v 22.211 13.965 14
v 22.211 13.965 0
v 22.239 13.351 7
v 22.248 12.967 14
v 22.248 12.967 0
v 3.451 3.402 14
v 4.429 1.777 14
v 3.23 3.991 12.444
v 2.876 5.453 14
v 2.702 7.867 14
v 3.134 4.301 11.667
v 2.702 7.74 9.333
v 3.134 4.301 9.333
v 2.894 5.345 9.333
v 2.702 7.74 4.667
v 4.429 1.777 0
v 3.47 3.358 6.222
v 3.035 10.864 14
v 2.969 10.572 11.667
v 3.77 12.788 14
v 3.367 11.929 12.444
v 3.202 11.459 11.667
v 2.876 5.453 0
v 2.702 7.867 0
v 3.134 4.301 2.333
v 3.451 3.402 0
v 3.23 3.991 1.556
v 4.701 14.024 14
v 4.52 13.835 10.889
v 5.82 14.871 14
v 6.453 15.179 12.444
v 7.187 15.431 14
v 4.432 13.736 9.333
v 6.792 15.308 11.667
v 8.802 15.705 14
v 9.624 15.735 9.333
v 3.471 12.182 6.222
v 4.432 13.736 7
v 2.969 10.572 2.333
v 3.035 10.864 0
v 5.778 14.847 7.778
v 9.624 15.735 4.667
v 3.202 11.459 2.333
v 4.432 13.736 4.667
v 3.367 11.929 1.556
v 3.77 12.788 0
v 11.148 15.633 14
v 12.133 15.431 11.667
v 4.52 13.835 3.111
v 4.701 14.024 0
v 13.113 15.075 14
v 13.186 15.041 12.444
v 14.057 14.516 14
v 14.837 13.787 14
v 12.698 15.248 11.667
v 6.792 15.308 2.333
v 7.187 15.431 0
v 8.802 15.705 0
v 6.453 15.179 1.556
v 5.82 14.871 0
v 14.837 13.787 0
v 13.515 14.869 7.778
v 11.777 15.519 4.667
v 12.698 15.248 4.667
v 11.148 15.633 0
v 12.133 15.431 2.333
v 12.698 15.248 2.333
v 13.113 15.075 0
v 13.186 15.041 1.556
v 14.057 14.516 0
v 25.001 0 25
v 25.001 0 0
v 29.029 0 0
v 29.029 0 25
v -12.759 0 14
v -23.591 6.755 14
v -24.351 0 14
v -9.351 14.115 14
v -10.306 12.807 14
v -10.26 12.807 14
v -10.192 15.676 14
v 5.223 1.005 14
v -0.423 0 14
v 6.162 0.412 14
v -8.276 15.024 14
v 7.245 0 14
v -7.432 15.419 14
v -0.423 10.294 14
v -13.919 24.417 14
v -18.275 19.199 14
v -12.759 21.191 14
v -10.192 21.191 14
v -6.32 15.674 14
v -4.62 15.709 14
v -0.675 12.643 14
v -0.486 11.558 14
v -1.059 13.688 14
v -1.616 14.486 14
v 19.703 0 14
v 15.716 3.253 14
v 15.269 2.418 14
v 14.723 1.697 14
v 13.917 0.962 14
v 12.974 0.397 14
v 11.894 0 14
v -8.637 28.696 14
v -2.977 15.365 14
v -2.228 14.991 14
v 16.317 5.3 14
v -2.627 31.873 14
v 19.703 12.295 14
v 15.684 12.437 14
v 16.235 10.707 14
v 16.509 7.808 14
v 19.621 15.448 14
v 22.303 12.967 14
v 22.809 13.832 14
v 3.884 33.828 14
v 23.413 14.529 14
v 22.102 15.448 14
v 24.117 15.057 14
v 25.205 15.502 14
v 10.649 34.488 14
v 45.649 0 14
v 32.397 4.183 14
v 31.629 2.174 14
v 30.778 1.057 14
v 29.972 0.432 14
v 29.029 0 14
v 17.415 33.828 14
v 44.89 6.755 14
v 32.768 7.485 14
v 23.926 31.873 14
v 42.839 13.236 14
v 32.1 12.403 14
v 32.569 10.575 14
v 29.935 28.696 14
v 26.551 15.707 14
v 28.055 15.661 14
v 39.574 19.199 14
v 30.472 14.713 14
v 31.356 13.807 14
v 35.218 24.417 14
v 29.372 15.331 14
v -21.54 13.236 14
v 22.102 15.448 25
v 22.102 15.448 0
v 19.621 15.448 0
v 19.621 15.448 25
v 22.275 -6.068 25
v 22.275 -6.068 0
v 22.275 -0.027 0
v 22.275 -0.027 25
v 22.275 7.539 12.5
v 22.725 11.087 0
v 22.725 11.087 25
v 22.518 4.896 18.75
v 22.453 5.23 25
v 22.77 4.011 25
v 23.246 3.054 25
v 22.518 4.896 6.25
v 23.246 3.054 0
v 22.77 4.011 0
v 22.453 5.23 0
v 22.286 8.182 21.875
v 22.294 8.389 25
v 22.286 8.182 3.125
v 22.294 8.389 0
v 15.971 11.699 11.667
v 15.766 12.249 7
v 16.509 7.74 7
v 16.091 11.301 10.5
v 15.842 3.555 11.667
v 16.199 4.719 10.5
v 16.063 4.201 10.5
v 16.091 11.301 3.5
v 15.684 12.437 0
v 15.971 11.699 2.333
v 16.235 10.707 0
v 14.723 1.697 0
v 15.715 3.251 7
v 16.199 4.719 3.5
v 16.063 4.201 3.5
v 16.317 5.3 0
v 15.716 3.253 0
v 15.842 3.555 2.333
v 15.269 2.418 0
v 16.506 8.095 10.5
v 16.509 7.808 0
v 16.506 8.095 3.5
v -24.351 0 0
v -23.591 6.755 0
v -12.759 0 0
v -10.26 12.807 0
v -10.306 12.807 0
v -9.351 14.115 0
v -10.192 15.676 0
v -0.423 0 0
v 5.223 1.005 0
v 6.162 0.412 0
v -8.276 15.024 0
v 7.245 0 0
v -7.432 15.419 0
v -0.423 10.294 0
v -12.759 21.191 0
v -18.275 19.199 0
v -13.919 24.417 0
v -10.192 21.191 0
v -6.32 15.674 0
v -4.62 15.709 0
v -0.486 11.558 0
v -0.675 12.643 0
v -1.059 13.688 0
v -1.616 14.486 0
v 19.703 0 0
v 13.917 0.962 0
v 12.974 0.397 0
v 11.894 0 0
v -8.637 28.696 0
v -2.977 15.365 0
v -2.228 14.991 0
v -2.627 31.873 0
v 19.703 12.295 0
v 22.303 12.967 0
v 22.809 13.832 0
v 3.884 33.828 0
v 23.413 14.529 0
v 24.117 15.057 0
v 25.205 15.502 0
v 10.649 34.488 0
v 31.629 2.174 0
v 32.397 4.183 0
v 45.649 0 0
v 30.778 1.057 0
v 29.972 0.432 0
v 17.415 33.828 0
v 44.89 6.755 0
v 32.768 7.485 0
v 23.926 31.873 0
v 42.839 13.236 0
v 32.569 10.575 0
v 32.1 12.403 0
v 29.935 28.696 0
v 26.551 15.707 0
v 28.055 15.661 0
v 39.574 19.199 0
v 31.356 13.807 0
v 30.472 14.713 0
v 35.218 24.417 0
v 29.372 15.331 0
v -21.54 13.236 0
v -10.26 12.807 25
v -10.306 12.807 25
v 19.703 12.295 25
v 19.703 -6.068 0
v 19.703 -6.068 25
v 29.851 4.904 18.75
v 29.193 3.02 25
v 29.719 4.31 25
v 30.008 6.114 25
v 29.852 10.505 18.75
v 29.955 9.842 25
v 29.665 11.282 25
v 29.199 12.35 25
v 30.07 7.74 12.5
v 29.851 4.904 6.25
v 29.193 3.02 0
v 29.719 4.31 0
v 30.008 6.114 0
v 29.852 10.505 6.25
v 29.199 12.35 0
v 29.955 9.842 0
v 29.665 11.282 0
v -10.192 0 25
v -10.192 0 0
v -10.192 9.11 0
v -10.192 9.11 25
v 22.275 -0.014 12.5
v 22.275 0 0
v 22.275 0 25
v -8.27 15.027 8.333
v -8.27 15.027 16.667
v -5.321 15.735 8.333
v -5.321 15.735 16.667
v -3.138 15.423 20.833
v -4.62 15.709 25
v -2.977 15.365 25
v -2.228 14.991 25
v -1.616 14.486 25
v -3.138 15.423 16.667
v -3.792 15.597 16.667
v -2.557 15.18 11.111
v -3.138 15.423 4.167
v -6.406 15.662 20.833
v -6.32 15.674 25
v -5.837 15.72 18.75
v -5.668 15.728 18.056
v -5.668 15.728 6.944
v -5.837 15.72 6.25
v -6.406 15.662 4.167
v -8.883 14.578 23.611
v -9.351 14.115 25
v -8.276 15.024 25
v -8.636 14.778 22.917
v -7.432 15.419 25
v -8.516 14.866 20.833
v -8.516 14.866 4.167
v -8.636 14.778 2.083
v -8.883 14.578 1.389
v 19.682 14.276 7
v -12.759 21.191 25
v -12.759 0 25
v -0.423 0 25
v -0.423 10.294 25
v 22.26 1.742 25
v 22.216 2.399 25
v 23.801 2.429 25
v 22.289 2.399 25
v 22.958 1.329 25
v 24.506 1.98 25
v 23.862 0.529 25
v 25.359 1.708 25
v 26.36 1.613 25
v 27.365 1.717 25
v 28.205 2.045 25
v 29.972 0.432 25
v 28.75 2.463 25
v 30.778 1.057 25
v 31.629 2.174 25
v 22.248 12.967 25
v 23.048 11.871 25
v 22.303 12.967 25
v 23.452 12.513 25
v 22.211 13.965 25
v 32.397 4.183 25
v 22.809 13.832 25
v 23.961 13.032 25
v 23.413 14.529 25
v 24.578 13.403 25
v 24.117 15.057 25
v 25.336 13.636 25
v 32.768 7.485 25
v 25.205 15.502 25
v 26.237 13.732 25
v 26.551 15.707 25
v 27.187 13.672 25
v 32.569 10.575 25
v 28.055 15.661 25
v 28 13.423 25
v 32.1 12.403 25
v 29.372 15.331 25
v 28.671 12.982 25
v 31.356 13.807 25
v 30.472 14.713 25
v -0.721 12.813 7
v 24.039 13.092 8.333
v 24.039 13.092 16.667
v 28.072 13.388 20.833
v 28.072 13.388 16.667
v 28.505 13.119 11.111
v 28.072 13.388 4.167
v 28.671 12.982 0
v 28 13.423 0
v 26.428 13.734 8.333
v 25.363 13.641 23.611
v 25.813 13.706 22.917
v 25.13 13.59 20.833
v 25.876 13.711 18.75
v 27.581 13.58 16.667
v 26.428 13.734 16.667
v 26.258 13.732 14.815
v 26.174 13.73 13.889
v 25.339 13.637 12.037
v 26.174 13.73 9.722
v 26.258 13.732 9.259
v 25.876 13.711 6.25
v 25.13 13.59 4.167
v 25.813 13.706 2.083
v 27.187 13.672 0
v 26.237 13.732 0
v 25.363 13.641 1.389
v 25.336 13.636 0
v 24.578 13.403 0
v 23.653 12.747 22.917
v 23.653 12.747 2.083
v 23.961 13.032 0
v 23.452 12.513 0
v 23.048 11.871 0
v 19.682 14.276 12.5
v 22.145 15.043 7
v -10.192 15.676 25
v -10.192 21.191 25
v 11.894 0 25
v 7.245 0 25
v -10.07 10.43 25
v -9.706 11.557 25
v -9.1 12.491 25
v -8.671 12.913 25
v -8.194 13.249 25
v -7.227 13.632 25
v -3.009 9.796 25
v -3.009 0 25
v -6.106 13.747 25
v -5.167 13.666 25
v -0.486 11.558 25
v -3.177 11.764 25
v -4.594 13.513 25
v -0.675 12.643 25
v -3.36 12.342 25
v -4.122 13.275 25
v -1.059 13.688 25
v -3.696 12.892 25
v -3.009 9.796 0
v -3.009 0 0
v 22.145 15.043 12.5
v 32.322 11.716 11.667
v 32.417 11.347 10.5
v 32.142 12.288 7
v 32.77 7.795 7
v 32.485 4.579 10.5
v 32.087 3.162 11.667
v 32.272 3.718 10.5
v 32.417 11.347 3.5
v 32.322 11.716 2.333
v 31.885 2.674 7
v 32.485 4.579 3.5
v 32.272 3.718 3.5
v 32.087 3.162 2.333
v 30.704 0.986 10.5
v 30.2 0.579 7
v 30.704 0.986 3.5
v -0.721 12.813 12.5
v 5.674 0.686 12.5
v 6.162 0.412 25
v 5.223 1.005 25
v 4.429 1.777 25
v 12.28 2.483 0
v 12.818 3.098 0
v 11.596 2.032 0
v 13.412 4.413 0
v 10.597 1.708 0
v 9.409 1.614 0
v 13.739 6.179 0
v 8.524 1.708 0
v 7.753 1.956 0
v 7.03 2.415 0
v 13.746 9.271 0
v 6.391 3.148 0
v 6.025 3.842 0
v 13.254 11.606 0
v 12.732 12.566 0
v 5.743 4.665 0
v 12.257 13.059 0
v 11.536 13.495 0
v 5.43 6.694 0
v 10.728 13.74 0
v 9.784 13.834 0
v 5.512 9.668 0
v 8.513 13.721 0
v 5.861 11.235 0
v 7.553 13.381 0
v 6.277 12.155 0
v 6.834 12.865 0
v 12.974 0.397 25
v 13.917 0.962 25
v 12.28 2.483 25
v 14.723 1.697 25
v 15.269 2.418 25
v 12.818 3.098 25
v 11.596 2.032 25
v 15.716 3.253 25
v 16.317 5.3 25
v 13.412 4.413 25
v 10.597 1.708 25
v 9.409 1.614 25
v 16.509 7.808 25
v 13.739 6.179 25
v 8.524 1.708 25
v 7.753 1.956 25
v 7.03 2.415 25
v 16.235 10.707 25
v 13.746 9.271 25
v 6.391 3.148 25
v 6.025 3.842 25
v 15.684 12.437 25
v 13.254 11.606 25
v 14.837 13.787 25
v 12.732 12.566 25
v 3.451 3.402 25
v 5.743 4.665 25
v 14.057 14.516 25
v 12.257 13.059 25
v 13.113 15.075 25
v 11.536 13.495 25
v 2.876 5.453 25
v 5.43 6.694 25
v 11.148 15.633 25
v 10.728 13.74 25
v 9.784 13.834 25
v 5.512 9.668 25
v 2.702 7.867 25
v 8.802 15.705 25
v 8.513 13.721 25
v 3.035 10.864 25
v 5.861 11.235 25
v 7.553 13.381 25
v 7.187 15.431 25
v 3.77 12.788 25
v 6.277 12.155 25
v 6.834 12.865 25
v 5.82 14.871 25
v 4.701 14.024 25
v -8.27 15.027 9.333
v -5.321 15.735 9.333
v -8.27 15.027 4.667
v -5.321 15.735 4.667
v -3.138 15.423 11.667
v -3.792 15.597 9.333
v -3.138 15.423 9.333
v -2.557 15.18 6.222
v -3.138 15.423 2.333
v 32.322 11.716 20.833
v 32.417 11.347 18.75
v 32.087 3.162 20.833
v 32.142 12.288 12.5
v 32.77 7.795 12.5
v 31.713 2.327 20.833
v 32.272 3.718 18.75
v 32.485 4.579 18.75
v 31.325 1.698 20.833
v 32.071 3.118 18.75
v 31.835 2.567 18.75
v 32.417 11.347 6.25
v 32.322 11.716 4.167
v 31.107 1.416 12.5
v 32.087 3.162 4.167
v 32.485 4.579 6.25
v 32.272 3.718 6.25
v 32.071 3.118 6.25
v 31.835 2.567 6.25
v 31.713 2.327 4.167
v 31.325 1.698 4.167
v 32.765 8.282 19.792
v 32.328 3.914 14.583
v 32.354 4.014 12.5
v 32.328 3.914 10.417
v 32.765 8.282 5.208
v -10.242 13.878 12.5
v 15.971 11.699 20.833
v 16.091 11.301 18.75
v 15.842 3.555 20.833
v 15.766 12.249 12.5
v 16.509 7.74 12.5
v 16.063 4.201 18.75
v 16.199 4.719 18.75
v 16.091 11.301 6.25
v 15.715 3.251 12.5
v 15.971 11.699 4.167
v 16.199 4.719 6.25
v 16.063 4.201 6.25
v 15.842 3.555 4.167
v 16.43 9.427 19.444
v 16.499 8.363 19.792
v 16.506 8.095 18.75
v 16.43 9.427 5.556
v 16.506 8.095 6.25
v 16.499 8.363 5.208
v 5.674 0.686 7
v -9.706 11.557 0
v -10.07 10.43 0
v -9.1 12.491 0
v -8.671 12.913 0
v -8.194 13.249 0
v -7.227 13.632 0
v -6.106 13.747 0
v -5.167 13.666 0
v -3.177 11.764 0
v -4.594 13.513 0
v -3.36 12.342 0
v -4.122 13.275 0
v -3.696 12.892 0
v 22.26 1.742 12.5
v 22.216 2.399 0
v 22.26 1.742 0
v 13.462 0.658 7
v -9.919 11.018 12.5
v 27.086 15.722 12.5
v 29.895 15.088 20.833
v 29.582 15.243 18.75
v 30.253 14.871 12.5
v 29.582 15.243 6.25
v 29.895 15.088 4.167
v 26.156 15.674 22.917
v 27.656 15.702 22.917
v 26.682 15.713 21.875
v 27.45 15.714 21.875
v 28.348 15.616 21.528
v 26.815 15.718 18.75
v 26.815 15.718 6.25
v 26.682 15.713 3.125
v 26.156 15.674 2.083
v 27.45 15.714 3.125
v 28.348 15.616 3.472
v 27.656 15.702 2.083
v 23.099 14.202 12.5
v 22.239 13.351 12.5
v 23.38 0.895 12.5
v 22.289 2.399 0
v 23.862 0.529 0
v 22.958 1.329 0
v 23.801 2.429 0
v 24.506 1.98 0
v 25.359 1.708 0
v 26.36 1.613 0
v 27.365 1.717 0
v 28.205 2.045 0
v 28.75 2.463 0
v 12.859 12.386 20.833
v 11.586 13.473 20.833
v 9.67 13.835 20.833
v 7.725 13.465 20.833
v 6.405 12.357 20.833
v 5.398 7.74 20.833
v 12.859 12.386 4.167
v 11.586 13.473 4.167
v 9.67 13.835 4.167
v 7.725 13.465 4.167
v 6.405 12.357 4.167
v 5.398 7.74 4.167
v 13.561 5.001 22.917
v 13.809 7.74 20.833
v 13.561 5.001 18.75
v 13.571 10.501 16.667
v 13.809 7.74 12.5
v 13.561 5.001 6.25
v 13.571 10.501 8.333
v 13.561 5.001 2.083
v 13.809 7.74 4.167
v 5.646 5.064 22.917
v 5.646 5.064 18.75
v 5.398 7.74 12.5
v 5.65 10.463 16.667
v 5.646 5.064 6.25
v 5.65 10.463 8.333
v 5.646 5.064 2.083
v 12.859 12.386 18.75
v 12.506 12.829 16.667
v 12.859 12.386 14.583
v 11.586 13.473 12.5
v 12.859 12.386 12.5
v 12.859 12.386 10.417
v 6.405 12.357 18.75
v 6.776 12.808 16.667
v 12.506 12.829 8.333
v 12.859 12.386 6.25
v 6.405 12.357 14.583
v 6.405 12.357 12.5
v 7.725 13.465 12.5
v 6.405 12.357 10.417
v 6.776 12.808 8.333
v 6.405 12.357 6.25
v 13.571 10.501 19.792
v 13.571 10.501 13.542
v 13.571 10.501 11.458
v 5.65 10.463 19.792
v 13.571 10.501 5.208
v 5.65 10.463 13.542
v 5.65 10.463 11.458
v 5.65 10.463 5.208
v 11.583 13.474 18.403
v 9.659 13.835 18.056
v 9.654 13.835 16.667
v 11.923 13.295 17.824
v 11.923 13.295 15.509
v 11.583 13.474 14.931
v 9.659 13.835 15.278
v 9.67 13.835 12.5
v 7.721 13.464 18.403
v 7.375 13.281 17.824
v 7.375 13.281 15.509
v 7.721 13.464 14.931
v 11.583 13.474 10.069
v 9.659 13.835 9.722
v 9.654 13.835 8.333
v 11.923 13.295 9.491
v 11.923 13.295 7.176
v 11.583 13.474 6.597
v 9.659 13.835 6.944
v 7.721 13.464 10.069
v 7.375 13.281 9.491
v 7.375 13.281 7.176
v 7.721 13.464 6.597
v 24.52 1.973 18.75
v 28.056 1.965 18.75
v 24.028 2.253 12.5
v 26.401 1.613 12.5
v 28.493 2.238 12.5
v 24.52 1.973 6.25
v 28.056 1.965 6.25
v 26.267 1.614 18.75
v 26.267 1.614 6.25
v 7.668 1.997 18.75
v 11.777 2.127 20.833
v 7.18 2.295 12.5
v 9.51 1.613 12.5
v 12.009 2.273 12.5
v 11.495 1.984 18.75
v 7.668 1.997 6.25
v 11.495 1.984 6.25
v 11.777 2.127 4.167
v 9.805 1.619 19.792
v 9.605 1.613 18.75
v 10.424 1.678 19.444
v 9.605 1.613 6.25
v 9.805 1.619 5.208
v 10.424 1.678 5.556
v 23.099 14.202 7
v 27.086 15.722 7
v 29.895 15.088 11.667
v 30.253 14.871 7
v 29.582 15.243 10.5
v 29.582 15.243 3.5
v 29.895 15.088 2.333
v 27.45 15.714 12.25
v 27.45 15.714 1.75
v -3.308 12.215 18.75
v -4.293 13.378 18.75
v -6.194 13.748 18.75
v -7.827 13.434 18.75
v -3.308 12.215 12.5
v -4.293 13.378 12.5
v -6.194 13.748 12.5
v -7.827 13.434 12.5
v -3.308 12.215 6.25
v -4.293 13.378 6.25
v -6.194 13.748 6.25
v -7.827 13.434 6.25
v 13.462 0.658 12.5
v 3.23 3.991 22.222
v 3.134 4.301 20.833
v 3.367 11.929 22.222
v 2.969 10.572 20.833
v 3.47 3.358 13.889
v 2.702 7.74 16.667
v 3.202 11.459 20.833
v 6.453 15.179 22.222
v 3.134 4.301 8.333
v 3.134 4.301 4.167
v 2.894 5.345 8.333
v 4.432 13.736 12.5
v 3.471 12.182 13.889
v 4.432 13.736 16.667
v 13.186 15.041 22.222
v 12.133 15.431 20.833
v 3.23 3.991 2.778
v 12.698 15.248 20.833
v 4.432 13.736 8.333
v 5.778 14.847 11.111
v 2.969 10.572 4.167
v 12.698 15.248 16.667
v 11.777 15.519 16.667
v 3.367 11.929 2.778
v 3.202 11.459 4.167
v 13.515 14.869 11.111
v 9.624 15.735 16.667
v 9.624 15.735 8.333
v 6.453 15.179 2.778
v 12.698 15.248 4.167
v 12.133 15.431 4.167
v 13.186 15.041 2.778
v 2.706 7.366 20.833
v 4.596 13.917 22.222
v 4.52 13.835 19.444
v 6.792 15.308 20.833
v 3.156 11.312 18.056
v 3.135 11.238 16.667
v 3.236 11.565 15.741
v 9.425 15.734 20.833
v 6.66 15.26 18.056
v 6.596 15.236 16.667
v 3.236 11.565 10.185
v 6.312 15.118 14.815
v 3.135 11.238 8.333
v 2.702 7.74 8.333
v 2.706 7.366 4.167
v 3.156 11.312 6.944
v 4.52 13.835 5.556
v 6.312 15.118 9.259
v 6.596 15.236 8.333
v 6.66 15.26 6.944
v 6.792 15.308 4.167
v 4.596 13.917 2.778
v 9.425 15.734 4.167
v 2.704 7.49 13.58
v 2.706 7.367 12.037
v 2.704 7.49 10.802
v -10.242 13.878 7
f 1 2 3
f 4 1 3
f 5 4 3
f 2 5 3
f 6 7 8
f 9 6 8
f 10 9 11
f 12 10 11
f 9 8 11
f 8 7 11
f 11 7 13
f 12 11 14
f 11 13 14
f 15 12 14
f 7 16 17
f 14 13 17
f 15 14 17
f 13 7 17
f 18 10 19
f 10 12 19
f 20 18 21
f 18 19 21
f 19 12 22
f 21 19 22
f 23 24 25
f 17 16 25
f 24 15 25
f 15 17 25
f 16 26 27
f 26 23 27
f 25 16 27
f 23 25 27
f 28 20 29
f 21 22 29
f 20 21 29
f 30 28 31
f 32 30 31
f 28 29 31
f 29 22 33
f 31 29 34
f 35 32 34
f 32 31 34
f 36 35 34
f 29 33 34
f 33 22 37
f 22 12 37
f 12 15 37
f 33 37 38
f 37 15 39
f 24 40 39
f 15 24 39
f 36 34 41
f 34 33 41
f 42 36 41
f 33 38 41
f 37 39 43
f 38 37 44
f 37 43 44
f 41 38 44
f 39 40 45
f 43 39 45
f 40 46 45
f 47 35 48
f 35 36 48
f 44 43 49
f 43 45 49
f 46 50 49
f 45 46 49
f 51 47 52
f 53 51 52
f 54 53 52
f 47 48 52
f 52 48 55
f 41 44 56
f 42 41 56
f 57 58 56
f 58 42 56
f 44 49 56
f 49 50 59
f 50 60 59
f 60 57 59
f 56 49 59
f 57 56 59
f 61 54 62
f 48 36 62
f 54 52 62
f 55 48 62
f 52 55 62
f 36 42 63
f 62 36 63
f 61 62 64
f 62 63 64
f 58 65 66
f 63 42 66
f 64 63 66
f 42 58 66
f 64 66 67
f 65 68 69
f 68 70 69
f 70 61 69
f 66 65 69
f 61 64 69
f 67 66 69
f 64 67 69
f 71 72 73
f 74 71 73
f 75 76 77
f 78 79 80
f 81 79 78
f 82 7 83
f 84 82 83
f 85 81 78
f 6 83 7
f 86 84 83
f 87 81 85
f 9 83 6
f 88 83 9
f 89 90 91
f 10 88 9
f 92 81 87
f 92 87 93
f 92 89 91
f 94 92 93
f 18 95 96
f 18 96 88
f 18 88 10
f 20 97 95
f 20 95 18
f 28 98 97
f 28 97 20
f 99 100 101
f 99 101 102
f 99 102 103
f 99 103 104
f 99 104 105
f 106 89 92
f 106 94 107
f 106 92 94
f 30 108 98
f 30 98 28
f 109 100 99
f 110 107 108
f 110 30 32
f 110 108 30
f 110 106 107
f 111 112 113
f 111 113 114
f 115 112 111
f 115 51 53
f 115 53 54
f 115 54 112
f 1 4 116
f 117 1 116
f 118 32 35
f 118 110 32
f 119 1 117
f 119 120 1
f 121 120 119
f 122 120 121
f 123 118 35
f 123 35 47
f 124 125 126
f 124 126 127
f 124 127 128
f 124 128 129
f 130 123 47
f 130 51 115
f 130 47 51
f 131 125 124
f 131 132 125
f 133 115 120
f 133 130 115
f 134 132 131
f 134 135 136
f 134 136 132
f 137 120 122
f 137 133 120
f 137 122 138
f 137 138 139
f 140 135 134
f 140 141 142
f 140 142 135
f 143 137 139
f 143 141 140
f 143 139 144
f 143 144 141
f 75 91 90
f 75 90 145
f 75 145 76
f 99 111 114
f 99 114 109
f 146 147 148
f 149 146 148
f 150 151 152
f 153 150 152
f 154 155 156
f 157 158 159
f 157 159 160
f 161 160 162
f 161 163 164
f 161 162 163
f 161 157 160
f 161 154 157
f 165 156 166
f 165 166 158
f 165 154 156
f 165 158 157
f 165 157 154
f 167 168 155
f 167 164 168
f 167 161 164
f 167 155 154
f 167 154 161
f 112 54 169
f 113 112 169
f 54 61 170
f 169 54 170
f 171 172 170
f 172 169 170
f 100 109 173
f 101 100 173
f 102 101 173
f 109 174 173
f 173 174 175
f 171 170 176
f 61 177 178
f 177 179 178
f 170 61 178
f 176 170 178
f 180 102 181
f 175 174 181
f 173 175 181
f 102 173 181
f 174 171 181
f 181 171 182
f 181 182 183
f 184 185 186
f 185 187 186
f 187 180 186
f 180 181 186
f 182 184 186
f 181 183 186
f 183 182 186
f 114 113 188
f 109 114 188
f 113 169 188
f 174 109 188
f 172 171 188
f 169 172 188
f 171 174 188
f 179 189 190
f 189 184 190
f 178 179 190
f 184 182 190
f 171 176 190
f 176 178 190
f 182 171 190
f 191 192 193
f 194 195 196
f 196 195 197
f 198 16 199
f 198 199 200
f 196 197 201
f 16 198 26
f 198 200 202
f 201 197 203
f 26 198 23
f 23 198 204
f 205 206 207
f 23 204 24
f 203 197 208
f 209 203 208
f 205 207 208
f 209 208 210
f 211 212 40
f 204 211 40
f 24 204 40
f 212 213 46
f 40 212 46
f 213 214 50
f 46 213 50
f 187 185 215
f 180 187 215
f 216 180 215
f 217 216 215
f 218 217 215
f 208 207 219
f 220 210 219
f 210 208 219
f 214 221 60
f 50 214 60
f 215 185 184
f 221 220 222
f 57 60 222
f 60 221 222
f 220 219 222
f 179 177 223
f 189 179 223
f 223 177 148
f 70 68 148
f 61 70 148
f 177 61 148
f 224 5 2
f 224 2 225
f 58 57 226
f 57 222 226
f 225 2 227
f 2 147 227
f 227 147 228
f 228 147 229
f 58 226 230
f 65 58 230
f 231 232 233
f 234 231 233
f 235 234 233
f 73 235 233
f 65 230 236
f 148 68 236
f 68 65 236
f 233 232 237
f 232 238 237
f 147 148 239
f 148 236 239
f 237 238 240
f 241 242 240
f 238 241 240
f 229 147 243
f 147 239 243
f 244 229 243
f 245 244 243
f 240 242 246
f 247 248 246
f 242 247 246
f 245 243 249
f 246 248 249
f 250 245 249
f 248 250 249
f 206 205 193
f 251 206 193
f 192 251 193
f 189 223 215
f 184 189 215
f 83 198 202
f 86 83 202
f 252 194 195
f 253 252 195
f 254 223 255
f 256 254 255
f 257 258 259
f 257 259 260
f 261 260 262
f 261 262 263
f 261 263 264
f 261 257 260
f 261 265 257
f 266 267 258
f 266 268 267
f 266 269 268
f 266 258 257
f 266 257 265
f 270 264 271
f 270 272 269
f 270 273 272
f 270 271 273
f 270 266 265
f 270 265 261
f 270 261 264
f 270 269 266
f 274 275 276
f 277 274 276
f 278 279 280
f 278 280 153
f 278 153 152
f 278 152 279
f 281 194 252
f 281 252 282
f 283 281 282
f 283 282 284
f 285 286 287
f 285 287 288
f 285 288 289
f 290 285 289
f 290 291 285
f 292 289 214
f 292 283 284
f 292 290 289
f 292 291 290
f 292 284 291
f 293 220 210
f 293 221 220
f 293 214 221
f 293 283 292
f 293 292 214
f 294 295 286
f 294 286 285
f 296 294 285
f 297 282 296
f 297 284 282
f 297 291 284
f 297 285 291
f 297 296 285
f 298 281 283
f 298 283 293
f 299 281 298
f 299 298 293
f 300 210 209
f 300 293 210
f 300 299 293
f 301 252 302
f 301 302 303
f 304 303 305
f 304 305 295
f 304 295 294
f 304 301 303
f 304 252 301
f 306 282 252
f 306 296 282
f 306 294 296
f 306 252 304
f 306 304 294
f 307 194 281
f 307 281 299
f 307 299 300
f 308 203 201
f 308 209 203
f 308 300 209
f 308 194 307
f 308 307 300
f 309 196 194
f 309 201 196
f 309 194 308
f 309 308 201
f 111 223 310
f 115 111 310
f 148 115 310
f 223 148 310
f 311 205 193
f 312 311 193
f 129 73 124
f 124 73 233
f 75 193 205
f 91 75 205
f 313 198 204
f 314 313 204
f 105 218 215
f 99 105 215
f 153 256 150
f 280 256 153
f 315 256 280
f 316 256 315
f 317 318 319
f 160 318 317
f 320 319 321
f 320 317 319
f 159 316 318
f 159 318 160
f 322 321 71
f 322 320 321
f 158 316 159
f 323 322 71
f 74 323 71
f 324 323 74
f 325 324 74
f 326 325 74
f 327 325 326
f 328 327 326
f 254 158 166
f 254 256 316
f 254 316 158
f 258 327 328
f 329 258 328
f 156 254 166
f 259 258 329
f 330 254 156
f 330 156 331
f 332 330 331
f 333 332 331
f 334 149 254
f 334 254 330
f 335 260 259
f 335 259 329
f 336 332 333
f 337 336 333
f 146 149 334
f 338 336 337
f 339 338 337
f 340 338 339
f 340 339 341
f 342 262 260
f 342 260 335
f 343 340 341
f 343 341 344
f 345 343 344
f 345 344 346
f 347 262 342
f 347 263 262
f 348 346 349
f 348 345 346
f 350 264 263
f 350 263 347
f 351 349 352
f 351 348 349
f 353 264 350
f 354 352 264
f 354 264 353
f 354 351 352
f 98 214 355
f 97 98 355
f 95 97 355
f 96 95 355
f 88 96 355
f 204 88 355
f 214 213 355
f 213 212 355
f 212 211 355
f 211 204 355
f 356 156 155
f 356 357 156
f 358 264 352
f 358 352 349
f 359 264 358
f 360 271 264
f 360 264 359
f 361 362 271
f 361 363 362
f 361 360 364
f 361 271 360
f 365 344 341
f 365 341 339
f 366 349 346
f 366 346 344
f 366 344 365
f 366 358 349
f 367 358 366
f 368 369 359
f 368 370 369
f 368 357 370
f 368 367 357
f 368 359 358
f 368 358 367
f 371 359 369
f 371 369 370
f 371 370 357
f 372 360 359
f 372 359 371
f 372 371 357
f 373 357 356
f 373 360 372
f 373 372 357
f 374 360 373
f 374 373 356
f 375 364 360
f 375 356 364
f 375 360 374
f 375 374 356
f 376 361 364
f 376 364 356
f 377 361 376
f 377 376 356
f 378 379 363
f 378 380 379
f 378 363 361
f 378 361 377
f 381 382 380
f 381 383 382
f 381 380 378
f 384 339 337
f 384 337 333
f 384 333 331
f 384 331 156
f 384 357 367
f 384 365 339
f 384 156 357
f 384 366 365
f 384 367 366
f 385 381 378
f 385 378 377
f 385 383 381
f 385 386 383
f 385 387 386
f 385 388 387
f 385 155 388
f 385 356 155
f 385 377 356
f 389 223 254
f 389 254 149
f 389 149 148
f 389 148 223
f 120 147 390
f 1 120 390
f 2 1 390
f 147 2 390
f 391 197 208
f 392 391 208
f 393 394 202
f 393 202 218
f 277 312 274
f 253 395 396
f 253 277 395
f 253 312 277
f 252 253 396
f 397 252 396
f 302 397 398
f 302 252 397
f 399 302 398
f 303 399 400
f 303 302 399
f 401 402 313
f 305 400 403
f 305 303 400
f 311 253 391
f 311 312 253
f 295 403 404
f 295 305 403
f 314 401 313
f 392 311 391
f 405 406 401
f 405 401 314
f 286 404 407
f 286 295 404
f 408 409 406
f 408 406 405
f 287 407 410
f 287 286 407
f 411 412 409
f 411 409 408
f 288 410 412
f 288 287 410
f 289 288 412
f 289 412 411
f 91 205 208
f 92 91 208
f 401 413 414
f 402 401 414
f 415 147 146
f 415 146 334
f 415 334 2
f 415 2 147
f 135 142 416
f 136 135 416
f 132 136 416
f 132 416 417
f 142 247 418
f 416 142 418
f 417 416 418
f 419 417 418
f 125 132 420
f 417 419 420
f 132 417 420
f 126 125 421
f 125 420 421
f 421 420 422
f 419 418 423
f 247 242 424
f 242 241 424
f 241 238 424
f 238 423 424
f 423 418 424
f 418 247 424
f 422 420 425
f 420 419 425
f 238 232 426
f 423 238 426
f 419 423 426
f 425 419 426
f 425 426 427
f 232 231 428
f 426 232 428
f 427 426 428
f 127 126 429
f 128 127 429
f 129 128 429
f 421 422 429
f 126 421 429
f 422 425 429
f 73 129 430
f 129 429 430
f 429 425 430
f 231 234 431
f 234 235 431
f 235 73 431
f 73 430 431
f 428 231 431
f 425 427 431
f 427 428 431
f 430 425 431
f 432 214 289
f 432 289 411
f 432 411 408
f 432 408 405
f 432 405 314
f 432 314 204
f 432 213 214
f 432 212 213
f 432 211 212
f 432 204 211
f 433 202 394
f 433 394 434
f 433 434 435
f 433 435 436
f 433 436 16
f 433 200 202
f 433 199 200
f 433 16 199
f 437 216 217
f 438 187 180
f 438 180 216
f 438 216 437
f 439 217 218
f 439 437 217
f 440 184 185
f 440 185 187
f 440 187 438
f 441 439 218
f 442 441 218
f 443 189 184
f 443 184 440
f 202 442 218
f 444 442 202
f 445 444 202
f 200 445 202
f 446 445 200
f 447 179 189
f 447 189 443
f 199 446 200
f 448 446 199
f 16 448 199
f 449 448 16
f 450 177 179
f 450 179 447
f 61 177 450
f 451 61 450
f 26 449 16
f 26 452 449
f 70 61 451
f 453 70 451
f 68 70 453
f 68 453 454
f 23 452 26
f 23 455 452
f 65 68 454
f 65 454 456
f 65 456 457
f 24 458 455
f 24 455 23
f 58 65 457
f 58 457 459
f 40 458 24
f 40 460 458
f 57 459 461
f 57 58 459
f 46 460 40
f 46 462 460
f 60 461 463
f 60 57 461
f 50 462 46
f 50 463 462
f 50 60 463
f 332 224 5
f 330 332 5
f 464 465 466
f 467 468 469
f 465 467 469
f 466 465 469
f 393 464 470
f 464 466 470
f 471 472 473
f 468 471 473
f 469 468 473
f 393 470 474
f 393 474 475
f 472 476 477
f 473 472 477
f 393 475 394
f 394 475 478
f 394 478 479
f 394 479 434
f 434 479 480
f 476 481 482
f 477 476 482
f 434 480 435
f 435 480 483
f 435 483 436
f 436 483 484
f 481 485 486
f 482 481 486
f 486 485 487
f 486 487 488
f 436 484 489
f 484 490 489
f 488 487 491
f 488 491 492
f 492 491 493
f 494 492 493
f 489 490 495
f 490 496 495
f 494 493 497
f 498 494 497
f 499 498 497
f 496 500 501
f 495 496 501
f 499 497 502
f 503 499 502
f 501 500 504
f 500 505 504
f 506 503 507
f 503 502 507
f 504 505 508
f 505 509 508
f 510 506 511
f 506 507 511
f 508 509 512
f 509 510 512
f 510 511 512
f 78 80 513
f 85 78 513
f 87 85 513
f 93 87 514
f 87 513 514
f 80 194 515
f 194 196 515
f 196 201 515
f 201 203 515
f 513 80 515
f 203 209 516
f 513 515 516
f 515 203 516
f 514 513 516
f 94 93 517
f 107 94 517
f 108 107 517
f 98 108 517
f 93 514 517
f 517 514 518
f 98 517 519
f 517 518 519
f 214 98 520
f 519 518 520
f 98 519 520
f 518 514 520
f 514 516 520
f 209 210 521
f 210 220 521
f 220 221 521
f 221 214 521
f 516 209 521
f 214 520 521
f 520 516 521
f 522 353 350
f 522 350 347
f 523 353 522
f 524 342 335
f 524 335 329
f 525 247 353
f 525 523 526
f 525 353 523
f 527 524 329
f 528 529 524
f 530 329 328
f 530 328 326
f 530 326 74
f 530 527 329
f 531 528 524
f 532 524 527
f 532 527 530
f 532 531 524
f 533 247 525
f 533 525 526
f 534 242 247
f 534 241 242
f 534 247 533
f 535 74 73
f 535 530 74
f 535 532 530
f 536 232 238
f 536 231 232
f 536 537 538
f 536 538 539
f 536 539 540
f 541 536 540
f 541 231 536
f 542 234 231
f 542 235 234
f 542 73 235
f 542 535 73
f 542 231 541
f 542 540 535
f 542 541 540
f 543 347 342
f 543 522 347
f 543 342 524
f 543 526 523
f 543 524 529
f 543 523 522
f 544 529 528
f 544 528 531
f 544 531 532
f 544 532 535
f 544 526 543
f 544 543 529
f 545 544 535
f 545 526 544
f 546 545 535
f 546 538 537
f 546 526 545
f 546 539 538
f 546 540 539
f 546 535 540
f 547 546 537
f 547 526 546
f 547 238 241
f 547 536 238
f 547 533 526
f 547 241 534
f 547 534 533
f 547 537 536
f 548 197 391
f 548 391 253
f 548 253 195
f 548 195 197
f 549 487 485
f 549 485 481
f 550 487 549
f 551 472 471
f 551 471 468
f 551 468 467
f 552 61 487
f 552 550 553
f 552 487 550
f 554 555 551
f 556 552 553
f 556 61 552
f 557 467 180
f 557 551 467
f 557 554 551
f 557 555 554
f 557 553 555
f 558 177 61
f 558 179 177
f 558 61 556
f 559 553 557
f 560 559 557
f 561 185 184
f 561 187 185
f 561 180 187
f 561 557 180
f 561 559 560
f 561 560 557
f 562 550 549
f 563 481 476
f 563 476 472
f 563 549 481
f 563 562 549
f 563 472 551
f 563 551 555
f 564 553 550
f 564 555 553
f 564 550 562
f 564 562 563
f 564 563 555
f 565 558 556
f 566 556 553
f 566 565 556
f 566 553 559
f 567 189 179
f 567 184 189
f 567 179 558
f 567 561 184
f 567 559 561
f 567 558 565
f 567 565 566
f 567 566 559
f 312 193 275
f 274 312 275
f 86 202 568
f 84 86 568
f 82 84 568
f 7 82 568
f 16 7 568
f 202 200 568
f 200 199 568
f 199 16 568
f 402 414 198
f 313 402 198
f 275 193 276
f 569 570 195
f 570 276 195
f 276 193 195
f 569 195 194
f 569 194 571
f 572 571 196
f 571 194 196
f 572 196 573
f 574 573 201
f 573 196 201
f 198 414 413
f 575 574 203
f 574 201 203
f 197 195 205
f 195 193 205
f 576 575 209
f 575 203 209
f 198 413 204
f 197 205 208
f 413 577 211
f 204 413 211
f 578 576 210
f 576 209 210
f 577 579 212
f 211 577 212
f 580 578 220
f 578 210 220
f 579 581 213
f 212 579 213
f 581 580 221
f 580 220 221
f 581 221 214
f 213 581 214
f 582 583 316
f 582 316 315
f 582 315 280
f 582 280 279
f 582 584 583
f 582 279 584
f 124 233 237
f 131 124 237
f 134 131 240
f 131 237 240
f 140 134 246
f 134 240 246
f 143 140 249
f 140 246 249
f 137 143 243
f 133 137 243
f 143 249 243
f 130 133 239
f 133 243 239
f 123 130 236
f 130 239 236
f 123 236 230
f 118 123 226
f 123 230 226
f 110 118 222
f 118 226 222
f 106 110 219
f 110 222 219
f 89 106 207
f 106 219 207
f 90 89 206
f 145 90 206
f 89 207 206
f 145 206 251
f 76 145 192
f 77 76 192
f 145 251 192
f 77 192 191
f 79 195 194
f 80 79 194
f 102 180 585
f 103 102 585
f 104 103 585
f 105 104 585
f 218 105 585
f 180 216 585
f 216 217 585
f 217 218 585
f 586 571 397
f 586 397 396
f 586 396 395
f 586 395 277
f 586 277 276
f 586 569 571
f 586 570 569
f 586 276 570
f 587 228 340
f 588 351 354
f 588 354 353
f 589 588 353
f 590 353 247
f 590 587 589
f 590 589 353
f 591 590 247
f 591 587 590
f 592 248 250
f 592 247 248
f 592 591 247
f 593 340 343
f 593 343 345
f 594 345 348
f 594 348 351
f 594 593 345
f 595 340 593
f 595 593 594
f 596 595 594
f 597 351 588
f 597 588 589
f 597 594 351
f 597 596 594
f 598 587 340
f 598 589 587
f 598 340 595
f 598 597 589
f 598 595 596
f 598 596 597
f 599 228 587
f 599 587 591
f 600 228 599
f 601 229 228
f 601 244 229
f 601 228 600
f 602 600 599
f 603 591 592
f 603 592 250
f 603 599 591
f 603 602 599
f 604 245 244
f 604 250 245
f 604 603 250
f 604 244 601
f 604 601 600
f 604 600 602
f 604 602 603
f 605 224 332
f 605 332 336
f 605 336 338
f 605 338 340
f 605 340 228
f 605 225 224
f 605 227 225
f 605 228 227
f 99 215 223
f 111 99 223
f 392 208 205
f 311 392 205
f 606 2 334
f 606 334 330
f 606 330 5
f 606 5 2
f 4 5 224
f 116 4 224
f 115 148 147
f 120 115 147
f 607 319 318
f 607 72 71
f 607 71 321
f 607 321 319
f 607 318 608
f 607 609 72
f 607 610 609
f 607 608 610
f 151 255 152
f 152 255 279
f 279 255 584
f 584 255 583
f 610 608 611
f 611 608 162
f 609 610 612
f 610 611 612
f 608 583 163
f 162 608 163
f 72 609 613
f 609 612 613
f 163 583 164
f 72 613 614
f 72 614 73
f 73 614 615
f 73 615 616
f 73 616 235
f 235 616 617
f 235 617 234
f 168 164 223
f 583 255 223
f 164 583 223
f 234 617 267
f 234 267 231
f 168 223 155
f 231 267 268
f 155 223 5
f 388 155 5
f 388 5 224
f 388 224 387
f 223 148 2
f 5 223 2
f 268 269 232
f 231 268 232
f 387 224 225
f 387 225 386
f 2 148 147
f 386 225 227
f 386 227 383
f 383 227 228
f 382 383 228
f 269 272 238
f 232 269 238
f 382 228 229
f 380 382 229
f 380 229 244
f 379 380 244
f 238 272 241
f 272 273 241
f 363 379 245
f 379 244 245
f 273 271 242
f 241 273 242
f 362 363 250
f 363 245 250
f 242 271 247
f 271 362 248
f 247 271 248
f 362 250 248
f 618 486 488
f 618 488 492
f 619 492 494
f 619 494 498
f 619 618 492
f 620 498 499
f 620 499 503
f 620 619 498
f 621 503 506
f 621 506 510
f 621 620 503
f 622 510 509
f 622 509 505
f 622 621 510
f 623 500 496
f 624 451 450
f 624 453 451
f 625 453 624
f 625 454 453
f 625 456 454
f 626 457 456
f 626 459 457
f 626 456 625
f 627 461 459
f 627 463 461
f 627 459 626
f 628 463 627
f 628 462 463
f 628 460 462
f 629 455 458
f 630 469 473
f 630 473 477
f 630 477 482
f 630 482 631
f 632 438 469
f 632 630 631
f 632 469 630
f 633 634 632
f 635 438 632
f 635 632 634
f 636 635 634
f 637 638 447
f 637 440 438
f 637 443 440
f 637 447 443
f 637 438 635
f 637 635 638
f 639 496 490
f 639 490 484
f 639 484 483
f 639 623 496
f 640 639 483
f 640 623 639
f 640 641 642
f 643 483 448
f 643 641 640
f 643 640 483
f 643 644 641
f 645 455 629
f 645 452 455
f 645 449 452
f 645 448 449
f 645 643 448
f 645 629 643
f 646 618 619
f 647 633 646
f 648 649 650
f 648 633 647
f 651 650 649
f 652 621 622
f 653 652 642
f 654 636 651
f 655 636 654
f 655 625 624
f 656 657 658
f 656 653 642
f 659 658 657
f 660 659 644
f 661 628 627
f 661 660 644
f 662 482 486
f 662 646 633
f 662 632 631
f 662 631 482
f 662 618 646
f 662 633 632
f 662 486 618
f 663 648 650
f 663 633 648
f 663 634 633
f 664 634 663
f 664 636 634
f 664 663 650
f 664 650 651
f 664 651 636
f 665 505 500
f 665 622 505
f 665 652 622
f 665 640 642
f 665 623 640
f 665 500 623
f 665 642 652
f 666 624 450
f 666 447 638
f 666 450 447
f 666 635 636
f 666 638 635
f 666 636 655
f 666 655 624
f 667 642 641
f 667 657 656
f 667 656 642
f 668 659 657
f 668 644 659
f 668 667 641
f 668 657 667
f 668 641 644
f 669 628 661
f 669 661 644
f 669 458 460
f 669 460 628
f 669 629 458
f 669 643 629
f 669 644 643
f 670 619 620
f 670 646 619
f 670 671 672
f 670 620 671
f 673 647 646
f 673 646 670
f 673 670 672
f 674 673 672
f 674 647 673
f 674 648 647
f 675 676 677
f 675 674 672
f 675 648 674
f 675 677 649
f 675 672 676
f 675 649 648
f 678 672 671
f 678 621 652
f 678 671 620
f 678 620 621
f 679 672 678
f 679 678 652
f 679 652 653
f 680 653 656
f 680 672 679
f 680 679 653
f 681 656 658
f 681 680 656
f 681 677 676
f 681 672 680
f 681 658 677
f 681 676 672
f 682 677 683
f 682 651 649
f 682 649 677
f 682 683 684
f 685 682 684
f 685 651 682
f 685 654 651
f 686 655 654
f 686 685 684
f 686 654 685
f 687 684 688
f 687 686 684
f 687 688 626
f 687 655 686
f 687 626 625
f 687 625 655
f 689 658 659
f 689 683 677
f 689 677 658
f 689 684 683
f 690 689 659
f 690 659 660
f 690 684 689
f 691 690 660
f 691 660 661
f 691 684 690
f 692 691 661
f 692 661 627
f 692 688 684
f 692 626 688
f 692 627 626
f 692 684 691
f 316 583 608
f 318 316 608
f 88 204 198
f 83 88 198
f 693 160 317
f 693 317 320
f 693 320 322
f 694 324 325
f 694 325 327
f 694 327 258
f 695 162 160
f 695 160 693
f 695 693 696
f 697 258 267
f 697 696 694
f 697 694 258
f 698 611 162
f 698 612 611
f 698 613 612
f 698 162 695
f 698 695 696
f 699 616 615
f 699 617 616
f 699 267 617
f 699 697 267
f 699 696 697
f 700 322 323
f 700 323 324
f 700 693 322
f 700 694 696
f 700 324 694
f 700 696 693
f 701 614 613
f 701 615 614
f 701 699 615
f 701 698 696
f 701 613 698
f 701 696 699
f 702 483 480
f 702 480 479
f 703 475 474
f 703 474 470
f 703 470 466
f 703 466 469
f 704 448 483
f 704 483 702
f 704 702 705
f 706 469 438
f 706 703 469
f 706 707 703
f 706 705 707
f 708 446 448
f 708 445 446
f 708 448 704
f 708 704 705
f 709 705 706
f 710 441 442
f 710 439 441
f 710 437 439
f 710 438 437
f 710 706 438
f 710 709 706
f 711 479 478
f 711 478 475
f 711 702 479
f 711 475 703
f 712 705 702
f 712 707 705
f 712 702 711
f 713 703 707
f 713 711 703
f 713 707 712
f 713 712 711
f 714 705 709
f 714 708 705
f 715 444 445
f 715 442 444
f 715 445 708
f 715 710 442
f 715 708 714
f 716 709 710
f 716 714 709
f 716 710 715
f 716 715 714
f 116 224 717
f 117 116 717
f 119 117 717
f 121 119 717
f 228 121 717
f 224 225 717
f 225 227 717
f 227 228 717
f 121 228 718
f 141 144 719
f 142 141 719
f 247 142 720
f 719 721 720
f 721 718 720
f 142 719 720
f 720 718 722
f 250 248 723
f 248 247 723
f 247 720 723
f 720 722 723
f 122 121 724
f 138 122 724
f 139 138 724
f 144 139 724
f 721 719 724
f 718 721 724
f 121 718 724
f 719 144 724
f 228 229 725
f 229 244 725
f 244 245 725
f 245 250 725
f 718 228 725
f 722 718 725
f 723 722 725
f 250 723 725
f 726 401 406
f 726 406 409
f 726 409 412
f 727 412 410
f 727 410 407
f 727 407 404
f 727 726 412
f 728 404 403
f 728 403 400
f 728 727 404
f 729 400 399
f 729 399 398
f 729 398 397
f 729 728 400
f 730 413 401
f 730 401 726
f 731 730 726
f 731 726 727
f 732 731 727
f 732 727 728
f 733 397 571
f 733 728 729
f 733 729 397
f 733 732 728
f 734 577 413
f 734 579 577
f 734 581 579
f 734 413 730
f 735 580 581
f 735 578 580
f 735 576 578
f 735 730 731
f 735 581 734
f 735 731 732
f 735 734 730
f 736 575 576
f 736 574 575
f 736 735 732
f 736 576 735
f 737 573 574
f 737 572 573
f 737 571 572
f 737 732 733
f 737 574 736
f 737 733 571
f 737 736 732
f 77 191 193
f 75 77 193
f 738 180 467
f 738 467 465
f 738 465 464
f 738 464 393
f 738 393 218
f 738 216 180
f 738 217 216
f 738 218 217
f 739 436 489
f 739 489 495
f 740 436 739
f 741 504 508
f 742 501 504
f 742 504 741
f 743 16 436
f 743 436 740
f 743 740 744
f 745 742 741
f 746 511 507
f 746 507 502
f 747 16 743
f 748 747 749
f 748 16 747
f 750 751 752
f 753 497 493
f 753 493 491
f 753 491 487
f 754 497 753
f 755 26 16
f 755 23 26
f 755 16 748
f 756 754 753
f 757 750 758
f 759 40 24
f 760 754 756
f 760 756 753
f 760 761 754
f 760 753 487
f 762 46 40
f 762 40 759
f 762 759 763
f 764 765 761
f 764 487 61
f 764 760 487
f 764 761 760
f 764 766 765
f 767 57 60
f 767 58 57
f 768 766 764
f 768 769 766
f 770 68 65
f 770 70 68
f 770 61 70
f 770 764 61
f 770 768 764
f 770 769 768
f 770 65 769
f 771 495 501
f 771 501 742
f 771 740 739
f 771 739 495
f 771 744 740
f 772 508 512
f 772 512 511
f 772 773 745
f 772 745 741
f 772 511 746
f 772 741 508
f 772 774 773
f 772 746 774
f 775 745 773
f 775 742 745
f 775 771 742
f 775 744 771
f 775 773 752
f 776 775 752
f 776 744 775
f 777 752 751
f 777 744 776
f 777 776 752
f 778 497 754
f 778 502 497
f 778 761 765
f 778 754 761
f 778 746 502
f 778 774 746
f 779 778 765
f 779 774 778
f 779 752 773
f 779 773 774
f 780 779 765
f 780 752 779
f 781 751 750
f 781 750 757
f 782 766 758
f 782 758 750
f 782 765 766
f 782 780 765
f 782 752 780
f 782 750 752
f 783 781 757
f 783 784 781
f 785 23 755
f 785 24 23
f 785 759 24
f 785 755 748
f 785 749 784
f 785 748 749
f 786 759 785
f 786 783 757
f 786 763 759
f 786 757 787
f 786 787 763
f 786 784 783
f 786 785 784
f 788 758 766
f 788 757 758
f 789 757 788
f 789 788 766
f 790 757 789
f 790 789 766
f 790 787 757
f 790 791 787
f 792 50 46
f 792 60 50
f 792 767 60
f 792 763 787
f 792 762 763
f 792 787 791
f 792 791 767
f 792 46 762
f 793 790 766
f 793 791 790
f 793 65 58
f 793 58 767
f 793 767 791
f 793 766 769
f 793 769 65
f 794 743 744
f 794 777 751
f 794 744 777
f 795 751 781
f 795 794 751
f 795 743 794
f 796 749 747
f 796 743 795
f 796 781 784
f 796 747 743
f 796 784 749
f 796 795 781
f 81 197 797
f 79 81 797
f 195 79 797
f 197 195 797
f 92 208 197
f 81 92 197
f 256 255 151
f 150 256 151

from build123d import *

# Parameters (mm, degrees)
F1_DEPTH = 25
F2_DEPTH = 14


with BuildPart() as f1:
    # F0 (on Top) → F1 (new body)
    with BuildSketch(Plane.XY):
        with BuildLine():
            Line((-12.7592669128, 21.1906875193), (-12.7592669128, 0))
            Line((-12.7592669128, 0), (-10.1915294428, 0))
            Line((-10.1915294428, 0), (-10.1915294428, 9.1104421978))
            add(Edge.make_bspline(
                [(-9.0995556789, 12.4914488309), (-10.1915294428, 11.2349936632), (-10.1915294428, 9.1104421978)],
                knots=[0, 0, 0, 1, 1, 1], degree=2))
            add(Edge.make_bspline(
                [(-6.1937175456, 13.7479039986), (-8.0075819149, 13.7479039986), (-9.0995556789, 12.4914488309)],
                knots=[0, 0, 0, 1, 1, 1], degree=2))
            add(Edge.make_bspline(
                [(-4.2930435464, 13.3778208401), (-4.9783827288, 13.7479039986), (-6.1937175456, 13.7479039986)],
                knots=[0, 0, 0, 1, 1, 1], degree=2))
            add(Edge.make_bspline(
                [(-3.3084395877, 12.215028694), (-3.607704364, 13.0077376816), (-4.2930435464, 13.3778208401)],
                knots=[0, 0, 0, 1, 1, 1], degree=2))
            add(Edge.make_bspline(
                [(-3.0091748114, 9.7957813802), (-3.0091748114, 11.4223197064), (-3.3084395877, 12.215028694)],
                knots=[0, 0, 0, 1, 1, 1], degree=2))
            Line((-3.0091748114, 9.7957813802), (-3.0091748114, 0))
            Line((-3.0091748114, 0), (-0.4231616299, 0))
            Line((-0.4231616299, 0), (-0.4231616299, 10.2937945194))
            add(Edge.make_bspline(
                [(-1.6156518072, 14.4857858516), (-0.4231616299, 13.2361840758), (-0.4231616299, 10.2937945194)],
                knots=[0, 0, 0, 1, 1, 1], degree=2))
            add(Edge.make_bspline(
                [(-5.32105232, 15.7353876275), (-2.8081419846, 15.7353876275), (-1.6156518072, 14.4857858516)],
                knots=[0, 0, 0, 1, 1, 1], degree=2))
            add(Edge.make_bspline(
                [(-8.2702952682, 15.0272038057), (-7.1075031221, 15.7353876275), (-5.32105232, 15.7353876275)],
                knots=[0, 0, 0, 1, 1, 1], degree=2))
            add(Edge.make_bspline(
                [(-10.260063361, 12.8067048548), (-9.4330874143, 14.3190199839), (-8.2702952682, 15.0272038057)],
                knots=[0, 0, 0, 1, 1, 1], degree=2))
            Line((-10.260063361, 12.8067048548), (-10.3057526399, 12.8067048548))
            add(Edge.make_bspline(
                [(-10.2417876495, 13.8781184433), (-10.2920458562, 12.9483416192), (-10.3057526399, 12.8067048548)],
                knots=[0, 0, 0, 1, 1, 1], degree=2))
            add(Edge.make_bspline(
                [(-10.1915294428, 15.675991565), (-10.1915294428, 14.8078952674), (-10.2417876495, 13.8781184433)],
                knots=[0, 0, 0, 1, 1, 1], degree=2))
            Line((-10.1915294428, 15.675991565), (-10.1915294428, 21.1906875193))
            Line((-10.1915294428, 21.1906875193), (-12.7592669128, 21.1906875193))
        make_face()
        with BuildLine():
            add(Edge.make_bspline(
                [(7.2449142086, 0), (5.51132105, 0.4831565087), (4.4290397814, 1.7773129463)],
                knots=[0.3733370206, 0.3733370206, 0.3733370206, 1, 1, 1], degree=2))
            Line((7.2449142086, 0), (11.8937666757, 0))
            add(Edge.make_bspline(
                [(14.7228343008, 1.6973567084), (13.6166302005, 0.4680838655), (11.8937666757, 0)],
                knots=[0, 0, 0, 0.6192188998, 0.6192188998, 0.6192188998], degree=2))
            add(Edge.make_bspline(
                [(16.5092851029, 7.739763833), (16.5092851029, 3.6825558733), (14.7228343008, 1.6973567084)],
                knots=[0, 0, 0, 1, 1, 1], degree=2))
            add(Edge.make_bspline(
                [(14.8370574978, 13.7867398856), (16.5092851029, 11.8380921437), (16.5092851029, 7.739763833)],
                knots=[0, 0, 0, 1, 1, 1], degree=2))
            add(Edge.make_bspline(
                [(9.6239107838, 15.7353876275), (13.1648298928, 15.7353876275), (14.8370574978, 13.7867398856)],
                knots=[0, 0, 0, 1, 1, 1], degree=2))
            add(Edge.make_bspline(
                [(2.7019850418, 7.739763833), (2.7019850418, 15.7353876275), (9.6239107838, 15.7353876275)],
                knots=[0, 0, 0, 1, 1, 1], degree=2))
            add(Edge.make_bspline(
                [(4.4290397814, 1.7773129463), (2.7019850418, 3.8424683492), (2.7019850418, 7.739763833)],
                knots=[0, 0, 0, 1, 1, 1], degree=2))
        make_face()
        with BuildLine():
            add(Edge.make_bspline(
                [(13.8090487243, 7.739763833), (13.8090487243, 10.9380133508), (12.8587117247, 12.3863634896)],
                knots=[0, 0, 0, 1, 1, 1], degree=2))
            add(Edge.make_bspline(
                [(12.8175913738, 3.0977331044), (13.8090487243, 4.5826346662), (13.8090487243, 7.739763833)],
                knots=[0, 0, 0, 1, 1, 1], degree=2))
            add(Edge.make_bspline(
                [(9.5096875868, 1.6128315425), (11.8261340232, 1.6128315425), (12.8175913738, 3.0977331044)],
                knots=[0, 0, 0, 1, 1, 1], degree=2))
            add(Edge.make_bspline(
                [(6.3913943069, 3.1479913111), (7.3851361214, 1.6128315425), (9.5096875868, 1.6128315425)],
                knots=[0, 0, 0, 1, 1, 1], degree=2))
            add(Edge.make_bspline(
                [(5.3976524925, 7.739763833), (5.3976524925, 4.6831510796), (6.3913943069, 3.1479913111)],
                knots=[0, 0, 0, 1, 1, 1], degree=2))
            add(Edge.make_bspline(
                [(6.4051010906, 12.3566654584), (5.3976524925, 10.8786172884), (5.3976524925, 7.739763833)],
                knots=[0, 0, 0, 1, 1, 1], degree=2))
            add(Edge.make_bspline(
                [(9.6696000627, 13.8347136284), (7.4125496887, 13.8347136284), (6.4051010906, 12.3566654584)],
                knots=[0, 0, 0, 1, 1, 1], degree=2))
            add(Edge.make_bspline(
                [(12.8587117247, 12.3863634896), (11.9083747251, 13.8347136284), (9.6696000627, 13.8347136284)],
                knots=[0, 0, 0, 1, 1, 1], degree=2))
        make_face(mode=Mode.SUBTRACT)
        with BuildLine():
            Line((25.0009693957, 0), (29.0291520059, 0))
            add(Edge.make_bspline(
                [(32.7700994369, 7.7945909676), (32.7700994369, 1.2374337453), (29.0291520059, 0)],
                knots=[0, 0, 0, 0.8112850274, 0.8112850274, 0.8112850274], degree=2))
            add(Edge.make_bspline(
                [(31.3560162572, 13.8073000611), (32.7700994369, 11.8929192783), (32.7700994369, 7.7945909676)],
                knots=[0, 0, 0, 1, 1, 1], degree=2))
            add(Edge.make_bspline(
                [(27.086353151, 15.7216808439), (29.9419330776, 15.7216808439), (31.3560162572, 13.8073000611)],
                knots=[0, 0, 0, 1, 1, 1], degree=2))
            add(Edge.make_bspline(
                [(24.1165500273, 15.056901837), (25.2450752143, 15.7216808439), (27.086353151, 15.7216808439)],
                knots=[0, 0, 0, 1, 1, 1], degree=2))
            add(Edge.make_bspline(
                [(22.3026856579, 12.9666173307), (22.9880248403, 14.39212283), (24.1165500273, 15.056901837)],
                knots=[0, 0, 0, 1, 1, 1], degree=2))
            Line((22.3026856579, 12.9666173307), (22.2478585233, 12.9666173307))
            add(Edge.make_bspline(
                [(22.2113071003, 13.964928073), (22.2478585233, 13.2361840758), (22.2478585233, 12.9666173307)],
                knots=[0, 0, 0, 1, 1, 1], degree=2))
            add(Edge.make_bspline(
                [(22.145057646, 15.0431950533), (22.1747556772, 14.6936720703), (22.2113071003, 13.964928073)],
                knots=[0, 0, 0, 1, 1, 1], degree=2))
            add(Edge.make_bspline(
                [(22.1016528311, 15.4475451709), (22.1153596148, 15.3927180363), (22.145057646, 15.0431950533)],
                knots=[0, 0, 0, 1, 1, 1], degree=2))
            Line((22.1016528311, 15.4475451709), (19.6207249909, 15.4475451709))
            add(Edge.make_bspline(
                [(19.7029656928, 12.294984932), (19.7029656928, 14.6799652867), (19.6207249909, 15.4475451709)],
                knots=[0, 0, 0, 1, 1, 1], degree=2))
            Line((19.7029656928, 12.294984932), (19.7029656928, 0))
            Line((19.7029656928, 0), (22.2752699909, 0))
            add(Edge.make_bspline(
                [(22.2158760282, 2.3986871383), (22.2749189421, 2.2851430731), (22.2752699909, 0)],
                knots=[0, 0, 0, 0.9940543441, 0.9940543441, 0.9940543441], degree=2))
            Line((22.2158760282, 2.3986871383), (22.2889788743, 2.3986871383))
            add(Edge.make_bspline(
                [(25.0009693957, 0), (23.1157221771, 0.5915307738), (22.2889788743, 2.3986871383)],
                knots=[0.3273268354, 0.3273268354, 0.3273268354, 1, 1, 1], degree=2))
        make_face()
        with BuildLine():
            add(Edge.make_bspline(
                [(30.0698630583, 7.739763833), (30.0698630583, 10.9654269181), (29.1994822967, 12.3498120665)],
                knots=[0, 0, 0, 1, 1, 1], degree=2))
            add(Edge.make_bspline(
                [(29.1926289048, 3.0200613304), (30.0698630583, 4.4272911182), (30.0698630583, 7.739763833)],
                knots=[0, 0, 0, 1, 1, 1], degree=2))
            add(Edge.make_bspline(
                [(26.4010139686, 1.6128315425), (28.3153947514, 1.6128315425), (29.1926289048, 3.0200613304)],
                knots=[0, 0, 0, 1, 1, 1], degree=2))
            add(Edge.make_bspline(
                [(23.2461692657, 3.0543282895), (24.2170664407, 1.6128315425), (26.4010139686, 1.6128315425)],
                knots=[0, 0, 0, 1, 1, 1], degree=2))
            add(Edge.make_bspline(
                [(22.2752720906, 7.5387310062), (22.2752720906, 4.4958250364), (23.2461692657, 3.0543282895)],
                knots=[0, 0, 0, 1, 1, 1], degree=2))
            add(Edge.make_bspline(
                [(22.7253114871, 11.086503507), (22.2752720906, 9.7226785341), (22.2752720906, 7.5387310062)],
                knots=[0, 0, 0, 1, 1, 1], degree=2))
            add(Edge.make_bspline(
                [(24.0388782533, 13.0922628475), (23.1753508835, 12.45032848), (22.7253114871, 11.086503507)],
                knots=[0, 0, 0, 1, 1, 1], degree=2))
            add(Edge.make_bspline(
                [(26.4284275359, 13.734197215), (24.9024056231, 13.734197215), (24.0388782533, 13.0922628475)],
                knots=[0, 0, 0, 1, 1, 1], degree=2))
            add(Edge.make_bspline(
                [(29.1994822967, 12.3498120665), (28.329101535, 13.734197215), (26.4284275359, 13.734197215)],
                knots=[0, 0, 0, 1, 1, 1], degree=2))
        make_face(mode=Mode.SUBTRACT)
        with BuildLine():
            add(Edge.make_bspline(
                [(22.2752699909, 0), (22.2752720906, -0.0136679392), (22.2752720906, -0.0274135673)],
                knots=[0.9940543441, 0.9940543441, 0.9940543441, 1, 1, 1], degree=2))
            Line((22.2752699909, 0), (19.7029656928, 0))
            Line((19.7029656928, 0), (19.7029656928, -6.067536228))
            Line((19.7029656928, -6.067536228), (22.2752720906, -6.067536228))
            Line((22.2752720906, -6.067536228), (22.2752720906, -0.0274135673))
        make_face()
    extrude(amount=F1_DEPTH)


with BuildPart() as f2:
    # F0 (on Top) → F2 (new body)
    with BuildSketch(Plane.XY):
        with BuildLine():
            ThreePointArc((45.649356842, 0), (10.649356842, 34.4880780529), (-24.350643158, 0))
            Line((-24.350643158, 0), (-12.7592669128, 0))
            Line((-12.7592669128, 0), (-12.7592669128, 21.1906875193))
            Line((-12.7592669128, 21.1906875193), (-10.1915294428, 21.1906875193))
            Line((-10.1915294428, 21.1906875193), (-10.1915294428, 15.675991565))
            add(Edge.make_bspline(
                [(-10.1915294428, 15.675991565), (-10.1915294428, 14.8078952674), (-10.2417876495, 13.8781184433)],
                knots=[0, 0, 0, 1, 1, 1], degree=2))
            add(Edge.make_bspline(
                [(-10.2417876495, 13.8781184433), (-10.2920458562, 12.9483416192), (-10.3057526399, 12.8067048548)],
                knots=[0, 0, 0, 1, 1, 1], degree=2))
            Line((-10.3057526399, 12.8067048548), (-10.260063361, 12.8067048548))
            add(Edge.make_bspline(
                [(-10.260063361, 12.8067048548), (-9.4330874143, 14.3190199839), (-8.2702952682, 15.0272038057)],
                knots=[0, 0, 0, 1, 1, 1], degree=2))
            add(Edge.make_bspline(
                [(-8.2702952682, 15.0272038057), (-7.1075031221, 15.7353876275), (-5.32105232, 15.7353876275)],
                knots=[0, 0, 0, 1, 1, 1], degree=2))
            add(Edge.make_bspline(
                [(-5.32105232, 15.7353876275), (-2.8081419846, 15.7353876275), (-1.6156518072, 14.4857858516)],
                knots=[0, 0, 0, 1, 1, 1], degree=2))
            add(Edge.make_bspline(
                [(-1.6156518072, 14.4857858516), (-0.4231616299, 13.2361840758), (-0.4231616299, 10.2937945194)],
                knots=[0, 0, 0, 1, 1, 1], degree=2))
            Line((-0.4231616299, 10.2937945194), (-0.4231616299, 0))
            Line((-0.4231616299, 0), (7.2449142086, 0))
            add(Edge.make_bspline(
                [(7.2449142086, 0), (5.51132105, 0.4831565087), (4.4290397814, 1.7773129463)],
                knots=[0.3733370206, 0.3733370206, 0.3733370206, 1, 1, 1], degree=2))
            add(Edge.make_bspline(
                [(4.4290397814, 1.7773129463), (2.7019850418, 3.8424683492), (2.7019850418, 7.739763833)],
                knots=[0, 0, 0, 1, 1, 1], degree=2))
            add(Edge.make_bspline(
                [(2.7019850418, 7.739763833), (2.7019850418, 15.7353876275), (9.6239107838, 15.7353876275)],
                knots=[0, 0, 0, 1, 1, 1], degree=2))
            add(Edge.make_bspline(
                [(9.6239107838, 15.7353876275), (13.1648298928, 15.7353876275), (14.8370574978, 13.7867398856)],
                knots=[0, 0, 0, 1, 1, 1], degree=2))
            add(Edge.make_bspline(
                [(14.8370574978, 13.7867398856), (16.5092851029, 11.8380921437), (16.5092851029, 7.739763833)],
                knots=[0, 0, 0, 1, 1, 1], degree=2))
            add(Edge.make_bspline(
                [(16.5092851029, 7.739763833), (16.5092851029, 3.6825558733), (14.7228343008, 1.6973567084)],
                knots=[0, 0, 0, 1, 1, 1], degree=2))
            add(Edge.make_bspline(
                [(14.7228343008, 1.6973567084), (13.6166302005, 0.4680838655), (11.8937666757, 0)],
                knots=[0, 0, 0, 0.6192188998, 0.6192188998, 0.6192188998], degree=2))
            Line((11.8937666757, 0), (19.7029656928, 0))
            Line((19.7029656928, 0), (19.7029656928, 12.294984932))
            add(Edge.make_bspline(
                [(19.7029656928, 12.294984932), (19.7029656928, 14.6799652867), (19.6207249909, 15.4475451709)],
                knots=[0, 0, 0, 1, 1, 1], degree=2))
            Line((19.6207249909, 15.4475451709), (22.1016528311, 15.4475451709))
            add(Edge.make_bspline(
                [(22.1016528311, 15.4475451709), (22.1153596148, 15.3927180363), (22.145057646, 15.0431950533)],
                knots=[0, 0, 0, 1, 1, 1], degree=2))
            add(Edge.make_bspline(
                [(22.145057646, 15.0431950533), (22.1747556772, 14.6936720703), (22.2113071003, 13.964928073)],
                knots=[0, 0, 0, 1, 1, 1], degree=2))
            add(Edge.make_bspline(
                [(22.2113071003, 13.964928073), (22.2478585233, 13.2361840758), (22.2478585233, 12.9666173307)],
                knots=[0, 0, 0, 1, 1, 1], degree=2))
            Line((22.2478585233, 12.9666173307), (22.3026856579, 12.9666173307))
            add(Edge.make_bspline(
                [(22.3026856579, 12.9666173307), (22.9880248403, 14.39212283), (24.1165500273, 15.056901837)],
                knots=[0, 0, 0, 1, 1, 1], degree=2))
            add(Edge.make_bspline(
                [(24.1165500273, 15.056901837), (25.2450752143, 15.7216808439), (27.086353151, 15.7216808439)],
                knots=[0, 0, 0, 1, 1, 1], degree=2))
            add(Edge.make_bspline(
                [(27.086353151, 15.7216808439), (29.9419330776, 15.7216808439), (31.3560162572, 13.8073000611)],
                knots=[0, 0, 0, 1, 1, 1], degree=2))
            add(Edge.make_bspline(
                [(31.3560162572, 13.8073000611), (32.7700994369, 11.8929192783), (32.7700994369, 7.7945909676)],
                knots=[0, 0, 0, 1, 1, 1], degree=2))
            add(Edge.make_bspline(
                [(32.7700994369, 7.7945909676), (32.7700994369, 1.2374337453), (29.0291520059, 0)],
                knots=[0, 0, 0, 0.8112850274, 0.8112850274, 0.8112850274], degree=2))
            Line((29.0291520059, 0), (45.649356842, 0))
        make_face()
    extrude(amount=F2_DEPTH)


solid = Compound([f1.part, f2.part])
